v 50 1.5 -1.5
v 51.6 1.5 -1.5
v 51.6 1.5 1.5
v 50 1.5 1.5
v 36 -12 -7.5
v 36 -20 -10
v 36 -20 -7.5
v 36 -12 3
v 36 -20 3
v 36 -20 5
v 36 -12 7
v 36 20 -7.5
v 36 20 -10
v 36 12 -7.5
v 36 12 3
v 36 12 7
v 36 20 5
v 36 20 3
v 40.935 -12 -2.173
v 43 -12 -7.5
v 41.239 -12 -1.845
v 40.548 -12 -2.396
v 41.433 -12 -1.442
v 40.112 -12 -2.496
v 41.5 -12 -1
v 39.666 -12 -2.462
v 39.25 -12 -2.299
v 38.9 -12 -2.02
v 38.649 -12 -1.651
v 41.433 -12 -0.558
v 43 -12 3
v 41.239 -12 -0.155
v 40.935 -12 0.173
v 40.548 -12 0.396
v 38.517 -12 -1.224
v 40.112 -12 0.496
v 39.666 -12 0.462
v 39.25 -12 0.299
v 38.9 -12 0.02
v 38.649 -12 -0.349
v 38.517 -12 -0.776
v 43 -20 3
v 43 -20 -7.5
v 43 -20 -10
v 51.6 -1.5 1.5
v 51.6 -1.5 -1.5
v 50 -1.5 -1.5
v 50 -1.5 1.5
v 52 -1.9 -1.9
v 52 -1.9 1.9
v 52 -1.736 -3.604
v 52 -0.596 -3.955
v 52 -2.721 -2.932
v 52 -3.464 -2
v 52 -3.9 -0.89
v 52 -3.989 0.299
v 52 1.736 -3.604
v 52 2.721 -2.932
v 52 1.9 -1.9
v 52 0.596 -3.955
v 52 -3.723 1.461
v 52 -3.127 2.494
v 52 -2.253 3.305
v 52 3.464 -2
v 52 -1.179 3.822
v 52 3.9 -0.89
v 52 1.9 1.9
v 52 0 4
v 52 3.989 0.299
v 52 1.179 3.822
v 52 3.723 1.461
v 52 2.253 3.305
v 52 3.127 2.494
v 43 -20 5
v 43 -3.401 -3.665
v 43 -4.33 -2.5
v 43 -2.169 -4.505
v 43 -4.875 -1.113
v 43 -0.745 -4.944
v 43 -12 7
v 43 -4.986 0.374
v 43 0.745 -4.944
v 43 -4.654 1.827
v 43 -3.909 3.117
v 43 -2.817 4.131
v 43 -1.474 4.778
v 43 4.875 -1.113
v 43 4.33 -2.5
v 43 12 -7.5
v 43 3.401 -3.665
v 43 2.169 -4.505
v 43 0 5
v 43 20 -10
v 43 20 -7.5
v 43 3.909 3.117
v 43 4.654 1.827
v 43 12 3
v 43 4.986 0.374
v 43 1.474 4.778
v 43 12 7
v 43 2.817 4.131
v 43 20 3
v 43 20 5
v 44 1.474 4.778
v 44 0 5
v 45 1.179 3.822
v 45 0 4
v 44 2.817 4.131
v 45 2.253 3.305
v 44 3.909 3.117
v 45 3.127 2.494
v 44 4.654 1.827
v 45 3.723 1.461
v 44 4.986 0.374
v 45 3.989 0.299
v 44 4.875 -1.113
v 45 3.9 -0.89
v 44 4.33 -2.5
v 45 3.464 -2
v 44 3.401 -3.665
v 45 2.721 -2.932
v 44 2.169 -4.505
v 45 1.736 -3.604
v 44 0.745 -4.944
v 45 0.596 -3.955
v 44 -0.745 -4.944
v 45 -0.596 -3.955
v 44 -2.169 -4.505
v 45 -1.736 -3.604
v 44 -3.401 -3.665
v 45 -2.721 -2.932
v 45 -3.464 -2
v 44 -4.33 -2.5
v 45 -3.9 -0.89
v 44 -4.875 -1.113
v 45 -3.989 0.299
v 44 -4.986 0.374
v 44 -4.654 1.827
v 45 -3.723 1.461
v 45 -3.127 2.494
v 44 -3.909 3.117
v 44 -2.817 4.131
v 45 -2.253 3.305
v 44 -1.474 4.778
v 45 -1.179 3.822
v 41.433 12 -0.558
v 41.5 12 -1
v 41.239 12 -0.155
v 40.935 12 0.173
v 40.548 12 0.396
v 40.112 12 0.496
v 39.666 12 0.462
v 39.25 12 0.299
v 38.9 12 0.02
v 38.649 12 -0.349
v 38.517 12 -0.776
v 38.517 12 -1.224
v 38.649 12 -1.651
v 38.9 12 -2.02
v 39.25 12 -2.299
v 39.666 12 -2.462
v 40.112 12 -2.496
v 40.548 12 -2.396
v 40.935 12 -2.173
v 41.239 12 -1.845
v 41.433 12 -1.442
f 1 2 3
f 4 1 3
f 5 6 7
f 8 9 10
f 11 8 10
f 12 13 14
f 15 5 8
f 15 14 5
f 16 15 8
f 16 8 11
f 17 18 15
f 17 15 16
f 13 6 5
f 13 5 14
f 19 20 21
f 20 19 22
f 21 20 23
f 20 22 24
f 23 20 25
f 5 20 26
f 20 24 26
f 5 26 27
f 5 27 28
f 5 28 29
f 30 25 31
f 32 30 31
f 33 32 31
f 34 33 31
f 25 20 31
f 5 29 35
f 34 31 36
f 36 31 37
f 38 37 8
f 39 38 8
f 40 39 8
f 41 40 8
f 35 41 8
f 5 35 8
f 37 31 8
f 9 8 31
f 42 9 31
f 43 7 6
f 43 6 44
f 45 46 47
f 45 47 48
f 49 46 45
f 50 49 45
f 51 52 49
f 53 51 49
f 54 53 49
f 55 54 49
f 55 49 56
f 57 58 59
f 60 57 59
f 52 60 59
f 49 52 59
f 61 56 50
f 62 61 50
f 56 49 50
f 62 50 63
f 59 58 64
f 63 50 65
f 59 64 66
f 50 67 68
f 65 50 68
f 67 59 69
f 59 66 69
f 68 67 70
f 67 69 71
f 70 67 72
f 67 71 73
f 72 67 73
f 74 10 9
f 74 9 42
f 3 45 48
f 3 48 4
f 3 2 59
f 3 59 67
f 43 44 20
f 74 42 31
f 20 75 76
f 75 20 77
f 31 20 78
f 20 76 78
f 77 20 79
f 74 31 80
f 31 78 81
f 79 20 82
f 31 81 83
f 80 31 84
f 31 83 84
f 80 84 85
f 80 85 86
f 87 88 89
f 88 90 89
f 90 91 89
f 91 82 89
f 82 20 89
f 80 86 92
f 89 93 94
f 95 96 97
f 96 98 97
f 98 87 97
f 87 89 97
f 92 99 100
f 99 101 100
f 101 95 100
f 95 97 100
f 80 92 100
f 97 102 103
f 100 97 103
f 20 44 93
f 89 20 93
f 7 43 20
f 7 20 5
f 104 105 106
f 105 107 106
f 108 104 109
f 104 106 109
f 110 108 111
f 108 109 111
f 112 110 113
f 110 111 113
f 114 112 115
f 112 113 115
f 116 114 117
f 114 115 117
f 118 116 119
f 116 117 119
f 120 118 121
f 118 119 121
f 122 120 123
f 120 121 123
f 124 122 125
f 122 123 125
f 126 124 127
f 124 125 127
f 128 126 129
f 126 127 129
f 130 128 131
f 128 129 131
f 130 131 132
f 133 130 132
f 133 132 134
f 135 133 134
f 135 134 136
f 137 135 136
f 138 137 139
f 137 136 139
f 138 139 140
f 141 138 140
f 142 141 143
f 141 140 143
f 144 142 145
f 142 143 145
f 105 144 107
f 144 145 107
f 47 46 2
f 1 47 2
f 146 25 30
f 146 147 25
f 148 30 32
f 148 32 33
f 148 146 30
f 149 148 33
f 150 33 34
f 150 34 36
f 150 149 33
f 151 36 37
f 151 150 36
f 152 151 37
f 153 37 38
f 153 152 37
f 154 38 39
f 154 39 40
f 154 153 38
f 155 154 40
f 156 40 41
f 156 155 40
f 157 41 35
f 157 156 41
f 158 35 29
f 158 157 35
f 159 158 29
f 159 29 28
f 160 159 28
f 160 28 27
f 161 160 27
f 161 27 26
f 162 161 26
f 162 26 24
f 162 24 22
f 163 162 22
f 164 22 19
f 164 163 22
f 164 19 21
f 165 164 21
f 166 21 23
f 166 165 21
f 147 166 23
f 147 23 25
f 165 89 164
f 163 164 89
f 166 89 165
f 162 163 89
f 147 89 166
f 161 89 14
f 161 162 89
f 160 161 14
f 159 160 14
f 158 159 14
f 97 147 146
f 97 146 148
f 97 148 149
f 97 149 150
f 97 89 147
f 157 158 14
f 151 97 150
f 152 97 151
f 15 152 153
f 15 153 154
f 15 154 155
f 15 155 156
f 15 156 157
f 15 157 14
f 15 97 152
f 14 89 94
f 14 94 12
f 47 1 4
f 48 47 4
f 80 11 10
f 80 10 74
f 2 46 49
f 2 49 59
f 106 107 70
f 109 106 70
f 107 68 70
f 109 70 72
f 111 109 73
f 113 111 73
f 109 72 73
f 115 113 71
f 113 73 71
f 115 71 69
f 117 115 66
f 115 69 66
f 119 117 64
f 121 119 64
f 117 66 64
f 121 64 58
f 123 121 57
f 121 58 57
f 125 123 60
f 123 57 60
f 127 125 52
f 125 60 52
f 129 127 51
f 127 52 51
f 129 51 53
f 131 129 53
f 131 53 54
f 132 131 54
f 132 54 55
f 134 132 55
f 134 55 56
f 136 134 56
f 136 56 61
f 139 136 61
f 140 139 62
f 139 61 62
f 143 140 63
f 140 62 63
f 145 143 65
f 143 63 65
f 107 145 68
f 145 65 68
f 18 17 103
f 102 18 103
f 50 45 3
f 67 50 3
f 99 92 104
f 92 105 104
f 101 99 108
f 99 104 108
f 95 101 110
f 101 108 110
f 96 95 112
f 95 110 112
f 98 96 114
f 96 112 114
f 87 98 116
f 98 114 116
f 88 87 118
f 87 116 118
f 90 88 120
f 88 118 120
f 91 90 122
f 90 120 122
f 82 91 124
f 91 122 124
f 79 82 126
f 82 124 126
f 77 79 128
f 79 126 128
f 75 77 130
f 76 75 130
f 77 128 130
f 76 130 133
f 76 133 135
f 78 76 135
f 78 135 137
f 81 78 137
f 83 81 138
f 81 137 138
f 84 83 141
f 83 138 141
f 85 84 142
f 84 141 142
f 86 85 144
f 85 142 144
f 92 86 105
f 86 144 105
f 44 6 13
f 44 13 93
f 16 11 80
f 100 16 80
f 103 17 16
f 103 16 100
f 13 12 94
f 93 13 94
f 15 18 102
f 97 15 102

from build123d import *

# Parameters (mm, degrees)
SKETCH153_W             = 7
SKETCH153_H             = 17
PAD051_DEPTH            = 20
SKETCH152_R             = 1.5
POCKET087_DEPTH         = 20
POCKET161_DEPTH         = 10
CHAMFER042_1_SIZE2      = 8
CHAMFER042_1_SIZE       = 2
CHAMFER042_2_SIZE2      = 8
CHAMFER042_2_SIZE       = 2
SKETCH276_W             = 3
SKETCH276_H             = 3
POCKET164_DEPTH         = 2
CHAMFER_SIZE            = 0.4
BODY018_PLACEMENT_ANGLE = 180


with BuildPart() as innerplateend:
    # Sketch153 → Pad051 (new body, symmetric)
    with BuildSketch(Plane.XZ):
        with Locations((39.5, -1.5)):
            Rectangle(SKETCH153_W, SKETCH153_H)
    extrude(amount=PAD051_DEPTH, both=True)

    # Sketch152 → Pocket087 (cut, symmetric)
    with BuildSketch(Plane.XZ):
        with Locations((40, -1)):
            Circle(SKETCH152_R)
    extrude(amount=POCKET087_DEPTH, both=True, mode=Mode.SUBTRACT)

    # Sketch250 → Revolution004 (revolve)
    with BuildSketch(Plane.XZ):
        Polygon((52, 0), (43, 0), (43, 5), (44, 5), (45, 4), (52, 4), align=None)
    revolve(axis=Axis((0, 0, 0), (1, 0, 0)))

    # Sketch267 → Pocket161 (cut)
    with BuildSketch(Plane.XZ.offset(12)):
        Polygon((43, -7.5), (36, -7.499985956), (36, 3), (43, 3), align=None)
    pocket161 = extrude(amount=POCKET161_DEPTH, mode=Mode.SUBTRACT)

    # Mirrored: Pocket161 across XZ
    add(pocket161.mirror(Plane.XZ), mode=Mode.SUBTRACT)

    # Chamfer042 1
    chamfer042_1_edges = [innerplateend.edges().sort_by_distance(p)[0] for p in [
        (39.5, 20, 7),
    ]]
    chamfer042_1_side = innerplateend.faces().sort_by_distance((39.5, 20, 5))[0]
    chamfer(chamfer042_1_edges, length=CHAMFER042_1_SIZE, length2=CHAMFER042_1_SIZE2, reference=chamfer042_1_side)

    # Chamfer042 2
    chamfer042_2_edges = [innerplateend.edges().sort_by_distance(p)[0] for p in [
        (39.5, -20, 7),
    ]]
    chamfer042_2_side = innerplateend.faces().sort_by_distance((39.5, -20, 5))[0]
    chamfer(chamfer042_2_edges, length=CHAMFER042_2_SIZE, length2=CHAMFER042_2_SIZE2, reference=chamfer042_2_side)

    # Sketch276 (on Face21 of Chamfer042) → Pocket164 (cut)
    with BuildSketch(Plane(origin=(52, 0, 0), x_dir=(0, 0, 1), z_dir=(1, 0, 0))):
        Rectangle(SKETCH276_W, SKETCH276_H)
    extrude(amount=-POCKET164_DEPTH, mode=Mode.SUBTRACT)

    # Chamfer
    chamfer_edges = [innerplateend.edges().sort_by_distance(p)[0] for p in [
        (52, 0, 1.5),
        (52, 1.5, 0),
        (52, 0, -1.5),
        (52, -1.5, 0),
    ]]
    chamfer(chamfer_edges, length=CHAMFER_SIZE)


with BuildPart() as innerplateend_1:
    # Body018 placement: moved
    add(innerplateend.part.rotate(Axis((0, 0, 0), (0, 0, 1)), BODY018_PLACEMENT_ANGLE))


with BuildPart() as ref_innerplateend:
    # Part__Mirroring002: instance of InnerPlateEnd
    add(innerplateend_1.part.mirror(Plane(origin=(0, 0, 0), x_dir=(0, -1, 0), z_dir=(1, 0, 0))))


solid = ref_innerplateend.part
